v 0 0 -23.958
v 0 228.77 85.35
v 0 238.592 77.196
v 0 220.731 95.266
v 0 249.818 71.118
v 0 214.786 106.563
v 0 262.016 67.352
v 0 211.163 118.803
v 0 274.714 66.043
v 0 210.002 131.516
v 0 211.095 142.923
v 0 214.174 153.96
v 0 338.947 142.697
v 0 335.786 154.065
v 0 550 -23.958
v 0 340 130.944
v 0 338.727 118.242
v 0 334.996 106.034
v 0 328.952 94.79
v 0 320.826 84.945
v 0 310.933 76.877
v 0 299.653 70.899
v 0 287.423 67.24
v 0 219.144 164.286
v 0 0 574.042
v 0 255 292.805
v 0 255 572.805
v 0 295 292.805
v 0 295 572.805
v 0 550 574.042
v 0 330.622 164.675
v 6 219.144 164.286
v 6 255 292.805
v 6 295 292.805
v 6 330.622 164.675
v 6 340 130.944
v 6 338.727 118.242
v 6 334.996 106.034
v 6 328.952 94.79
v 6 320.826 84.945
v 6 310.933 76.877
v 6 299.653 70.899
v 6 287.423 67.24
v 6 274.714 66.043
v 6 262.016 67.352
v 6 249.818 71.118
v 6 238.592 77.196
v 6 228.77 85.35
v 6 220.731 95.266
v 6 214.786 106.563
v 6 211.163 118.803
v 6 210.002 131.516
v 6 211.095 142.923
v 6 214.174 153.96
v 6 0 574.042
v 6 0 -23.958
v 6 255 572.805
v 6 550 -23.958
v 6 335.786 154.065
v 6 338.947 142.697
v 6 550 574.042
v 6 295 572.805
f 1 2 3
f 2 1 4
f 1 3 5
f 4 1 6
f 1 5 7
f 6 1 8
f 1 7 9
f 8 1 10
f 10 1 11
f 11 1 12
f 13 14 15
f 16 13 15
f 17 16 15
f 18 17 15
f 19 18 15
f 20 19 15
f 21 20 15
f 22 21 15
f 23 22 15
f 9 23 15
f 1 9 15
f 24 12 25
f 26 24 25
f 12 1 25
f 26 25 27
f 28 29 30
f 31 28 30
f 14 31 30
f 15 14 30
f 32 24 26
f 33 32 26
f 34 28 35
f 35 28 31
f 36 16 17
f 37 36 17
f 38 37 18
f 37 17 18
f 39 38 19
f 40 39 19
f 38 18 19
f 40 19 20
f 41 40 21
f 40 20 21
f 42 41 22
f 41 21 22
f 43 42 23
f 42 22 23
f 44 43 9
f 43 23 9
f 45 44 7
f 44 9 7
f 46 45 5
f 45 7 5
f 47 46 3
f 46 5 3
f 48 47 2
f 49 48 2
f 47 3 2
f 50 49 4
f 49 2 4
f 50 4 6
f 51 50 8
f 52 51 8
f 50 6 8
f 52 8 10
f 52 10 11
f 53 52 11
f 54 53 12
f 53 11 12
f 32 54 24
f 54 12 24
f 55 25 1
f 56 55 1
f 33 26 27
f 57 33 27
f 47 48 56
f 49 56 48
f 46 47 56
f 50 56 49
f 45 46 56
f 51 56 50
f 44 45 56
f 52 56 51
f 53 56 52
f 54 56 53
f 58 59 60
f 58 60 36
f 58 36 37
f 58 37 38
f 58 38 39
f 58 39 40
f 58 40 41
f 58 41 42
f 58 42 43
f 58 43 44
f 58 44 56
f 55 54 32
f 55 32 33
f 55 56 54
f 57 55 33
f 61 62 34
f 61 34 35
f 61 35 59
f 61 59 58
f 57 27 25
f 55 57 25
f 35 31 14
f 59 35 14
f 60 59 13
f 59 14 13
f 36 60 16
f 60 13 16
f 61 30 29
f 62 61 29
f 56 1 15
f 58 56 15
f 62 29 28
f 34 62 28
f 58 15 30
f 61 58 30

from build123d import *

# Parameters (mm, degrees)
F1_DEPTH = 6


with BuildPart() as f1:
    # F0 (on Right) → F1 (new body)
    with BuildSketch(Plane.YZ):
        with BuildLine():
            Line((0, 574.042232), (0, -23.957768))
            Line((0, -23.957768), (550, -23.957768))
            Line((550, -23.957768), (550, 574.042232))
            Line((550, 574.042232), (295, 572.804987))
            Line((295, 572.804987), (295, 292.804987))
            Line((295, 292.804987), (330.622028, 164.675401))
            ThreePointArc((330.622028, 164.675401), (337.624821, 148.452911), (339.999926, 130.943851))
            ThreePointArc((339.999926, 130.943851), (274.713963, 66.042861), (210.001726, 131.515923))
            ThreePointArc((210.001726, 131.515923), (212.390971, 148.509617), (219.144239, 164.285786))
            Line((219.144239, 164.285786), (255, 292.804987))
            Line((255, 292.804987), (255, 572.804987))
            Line((255, 572.804987), (0, 574.042232))
        make_face()
    extrude(amount=F1_DEPTH)


solid = f1.part
